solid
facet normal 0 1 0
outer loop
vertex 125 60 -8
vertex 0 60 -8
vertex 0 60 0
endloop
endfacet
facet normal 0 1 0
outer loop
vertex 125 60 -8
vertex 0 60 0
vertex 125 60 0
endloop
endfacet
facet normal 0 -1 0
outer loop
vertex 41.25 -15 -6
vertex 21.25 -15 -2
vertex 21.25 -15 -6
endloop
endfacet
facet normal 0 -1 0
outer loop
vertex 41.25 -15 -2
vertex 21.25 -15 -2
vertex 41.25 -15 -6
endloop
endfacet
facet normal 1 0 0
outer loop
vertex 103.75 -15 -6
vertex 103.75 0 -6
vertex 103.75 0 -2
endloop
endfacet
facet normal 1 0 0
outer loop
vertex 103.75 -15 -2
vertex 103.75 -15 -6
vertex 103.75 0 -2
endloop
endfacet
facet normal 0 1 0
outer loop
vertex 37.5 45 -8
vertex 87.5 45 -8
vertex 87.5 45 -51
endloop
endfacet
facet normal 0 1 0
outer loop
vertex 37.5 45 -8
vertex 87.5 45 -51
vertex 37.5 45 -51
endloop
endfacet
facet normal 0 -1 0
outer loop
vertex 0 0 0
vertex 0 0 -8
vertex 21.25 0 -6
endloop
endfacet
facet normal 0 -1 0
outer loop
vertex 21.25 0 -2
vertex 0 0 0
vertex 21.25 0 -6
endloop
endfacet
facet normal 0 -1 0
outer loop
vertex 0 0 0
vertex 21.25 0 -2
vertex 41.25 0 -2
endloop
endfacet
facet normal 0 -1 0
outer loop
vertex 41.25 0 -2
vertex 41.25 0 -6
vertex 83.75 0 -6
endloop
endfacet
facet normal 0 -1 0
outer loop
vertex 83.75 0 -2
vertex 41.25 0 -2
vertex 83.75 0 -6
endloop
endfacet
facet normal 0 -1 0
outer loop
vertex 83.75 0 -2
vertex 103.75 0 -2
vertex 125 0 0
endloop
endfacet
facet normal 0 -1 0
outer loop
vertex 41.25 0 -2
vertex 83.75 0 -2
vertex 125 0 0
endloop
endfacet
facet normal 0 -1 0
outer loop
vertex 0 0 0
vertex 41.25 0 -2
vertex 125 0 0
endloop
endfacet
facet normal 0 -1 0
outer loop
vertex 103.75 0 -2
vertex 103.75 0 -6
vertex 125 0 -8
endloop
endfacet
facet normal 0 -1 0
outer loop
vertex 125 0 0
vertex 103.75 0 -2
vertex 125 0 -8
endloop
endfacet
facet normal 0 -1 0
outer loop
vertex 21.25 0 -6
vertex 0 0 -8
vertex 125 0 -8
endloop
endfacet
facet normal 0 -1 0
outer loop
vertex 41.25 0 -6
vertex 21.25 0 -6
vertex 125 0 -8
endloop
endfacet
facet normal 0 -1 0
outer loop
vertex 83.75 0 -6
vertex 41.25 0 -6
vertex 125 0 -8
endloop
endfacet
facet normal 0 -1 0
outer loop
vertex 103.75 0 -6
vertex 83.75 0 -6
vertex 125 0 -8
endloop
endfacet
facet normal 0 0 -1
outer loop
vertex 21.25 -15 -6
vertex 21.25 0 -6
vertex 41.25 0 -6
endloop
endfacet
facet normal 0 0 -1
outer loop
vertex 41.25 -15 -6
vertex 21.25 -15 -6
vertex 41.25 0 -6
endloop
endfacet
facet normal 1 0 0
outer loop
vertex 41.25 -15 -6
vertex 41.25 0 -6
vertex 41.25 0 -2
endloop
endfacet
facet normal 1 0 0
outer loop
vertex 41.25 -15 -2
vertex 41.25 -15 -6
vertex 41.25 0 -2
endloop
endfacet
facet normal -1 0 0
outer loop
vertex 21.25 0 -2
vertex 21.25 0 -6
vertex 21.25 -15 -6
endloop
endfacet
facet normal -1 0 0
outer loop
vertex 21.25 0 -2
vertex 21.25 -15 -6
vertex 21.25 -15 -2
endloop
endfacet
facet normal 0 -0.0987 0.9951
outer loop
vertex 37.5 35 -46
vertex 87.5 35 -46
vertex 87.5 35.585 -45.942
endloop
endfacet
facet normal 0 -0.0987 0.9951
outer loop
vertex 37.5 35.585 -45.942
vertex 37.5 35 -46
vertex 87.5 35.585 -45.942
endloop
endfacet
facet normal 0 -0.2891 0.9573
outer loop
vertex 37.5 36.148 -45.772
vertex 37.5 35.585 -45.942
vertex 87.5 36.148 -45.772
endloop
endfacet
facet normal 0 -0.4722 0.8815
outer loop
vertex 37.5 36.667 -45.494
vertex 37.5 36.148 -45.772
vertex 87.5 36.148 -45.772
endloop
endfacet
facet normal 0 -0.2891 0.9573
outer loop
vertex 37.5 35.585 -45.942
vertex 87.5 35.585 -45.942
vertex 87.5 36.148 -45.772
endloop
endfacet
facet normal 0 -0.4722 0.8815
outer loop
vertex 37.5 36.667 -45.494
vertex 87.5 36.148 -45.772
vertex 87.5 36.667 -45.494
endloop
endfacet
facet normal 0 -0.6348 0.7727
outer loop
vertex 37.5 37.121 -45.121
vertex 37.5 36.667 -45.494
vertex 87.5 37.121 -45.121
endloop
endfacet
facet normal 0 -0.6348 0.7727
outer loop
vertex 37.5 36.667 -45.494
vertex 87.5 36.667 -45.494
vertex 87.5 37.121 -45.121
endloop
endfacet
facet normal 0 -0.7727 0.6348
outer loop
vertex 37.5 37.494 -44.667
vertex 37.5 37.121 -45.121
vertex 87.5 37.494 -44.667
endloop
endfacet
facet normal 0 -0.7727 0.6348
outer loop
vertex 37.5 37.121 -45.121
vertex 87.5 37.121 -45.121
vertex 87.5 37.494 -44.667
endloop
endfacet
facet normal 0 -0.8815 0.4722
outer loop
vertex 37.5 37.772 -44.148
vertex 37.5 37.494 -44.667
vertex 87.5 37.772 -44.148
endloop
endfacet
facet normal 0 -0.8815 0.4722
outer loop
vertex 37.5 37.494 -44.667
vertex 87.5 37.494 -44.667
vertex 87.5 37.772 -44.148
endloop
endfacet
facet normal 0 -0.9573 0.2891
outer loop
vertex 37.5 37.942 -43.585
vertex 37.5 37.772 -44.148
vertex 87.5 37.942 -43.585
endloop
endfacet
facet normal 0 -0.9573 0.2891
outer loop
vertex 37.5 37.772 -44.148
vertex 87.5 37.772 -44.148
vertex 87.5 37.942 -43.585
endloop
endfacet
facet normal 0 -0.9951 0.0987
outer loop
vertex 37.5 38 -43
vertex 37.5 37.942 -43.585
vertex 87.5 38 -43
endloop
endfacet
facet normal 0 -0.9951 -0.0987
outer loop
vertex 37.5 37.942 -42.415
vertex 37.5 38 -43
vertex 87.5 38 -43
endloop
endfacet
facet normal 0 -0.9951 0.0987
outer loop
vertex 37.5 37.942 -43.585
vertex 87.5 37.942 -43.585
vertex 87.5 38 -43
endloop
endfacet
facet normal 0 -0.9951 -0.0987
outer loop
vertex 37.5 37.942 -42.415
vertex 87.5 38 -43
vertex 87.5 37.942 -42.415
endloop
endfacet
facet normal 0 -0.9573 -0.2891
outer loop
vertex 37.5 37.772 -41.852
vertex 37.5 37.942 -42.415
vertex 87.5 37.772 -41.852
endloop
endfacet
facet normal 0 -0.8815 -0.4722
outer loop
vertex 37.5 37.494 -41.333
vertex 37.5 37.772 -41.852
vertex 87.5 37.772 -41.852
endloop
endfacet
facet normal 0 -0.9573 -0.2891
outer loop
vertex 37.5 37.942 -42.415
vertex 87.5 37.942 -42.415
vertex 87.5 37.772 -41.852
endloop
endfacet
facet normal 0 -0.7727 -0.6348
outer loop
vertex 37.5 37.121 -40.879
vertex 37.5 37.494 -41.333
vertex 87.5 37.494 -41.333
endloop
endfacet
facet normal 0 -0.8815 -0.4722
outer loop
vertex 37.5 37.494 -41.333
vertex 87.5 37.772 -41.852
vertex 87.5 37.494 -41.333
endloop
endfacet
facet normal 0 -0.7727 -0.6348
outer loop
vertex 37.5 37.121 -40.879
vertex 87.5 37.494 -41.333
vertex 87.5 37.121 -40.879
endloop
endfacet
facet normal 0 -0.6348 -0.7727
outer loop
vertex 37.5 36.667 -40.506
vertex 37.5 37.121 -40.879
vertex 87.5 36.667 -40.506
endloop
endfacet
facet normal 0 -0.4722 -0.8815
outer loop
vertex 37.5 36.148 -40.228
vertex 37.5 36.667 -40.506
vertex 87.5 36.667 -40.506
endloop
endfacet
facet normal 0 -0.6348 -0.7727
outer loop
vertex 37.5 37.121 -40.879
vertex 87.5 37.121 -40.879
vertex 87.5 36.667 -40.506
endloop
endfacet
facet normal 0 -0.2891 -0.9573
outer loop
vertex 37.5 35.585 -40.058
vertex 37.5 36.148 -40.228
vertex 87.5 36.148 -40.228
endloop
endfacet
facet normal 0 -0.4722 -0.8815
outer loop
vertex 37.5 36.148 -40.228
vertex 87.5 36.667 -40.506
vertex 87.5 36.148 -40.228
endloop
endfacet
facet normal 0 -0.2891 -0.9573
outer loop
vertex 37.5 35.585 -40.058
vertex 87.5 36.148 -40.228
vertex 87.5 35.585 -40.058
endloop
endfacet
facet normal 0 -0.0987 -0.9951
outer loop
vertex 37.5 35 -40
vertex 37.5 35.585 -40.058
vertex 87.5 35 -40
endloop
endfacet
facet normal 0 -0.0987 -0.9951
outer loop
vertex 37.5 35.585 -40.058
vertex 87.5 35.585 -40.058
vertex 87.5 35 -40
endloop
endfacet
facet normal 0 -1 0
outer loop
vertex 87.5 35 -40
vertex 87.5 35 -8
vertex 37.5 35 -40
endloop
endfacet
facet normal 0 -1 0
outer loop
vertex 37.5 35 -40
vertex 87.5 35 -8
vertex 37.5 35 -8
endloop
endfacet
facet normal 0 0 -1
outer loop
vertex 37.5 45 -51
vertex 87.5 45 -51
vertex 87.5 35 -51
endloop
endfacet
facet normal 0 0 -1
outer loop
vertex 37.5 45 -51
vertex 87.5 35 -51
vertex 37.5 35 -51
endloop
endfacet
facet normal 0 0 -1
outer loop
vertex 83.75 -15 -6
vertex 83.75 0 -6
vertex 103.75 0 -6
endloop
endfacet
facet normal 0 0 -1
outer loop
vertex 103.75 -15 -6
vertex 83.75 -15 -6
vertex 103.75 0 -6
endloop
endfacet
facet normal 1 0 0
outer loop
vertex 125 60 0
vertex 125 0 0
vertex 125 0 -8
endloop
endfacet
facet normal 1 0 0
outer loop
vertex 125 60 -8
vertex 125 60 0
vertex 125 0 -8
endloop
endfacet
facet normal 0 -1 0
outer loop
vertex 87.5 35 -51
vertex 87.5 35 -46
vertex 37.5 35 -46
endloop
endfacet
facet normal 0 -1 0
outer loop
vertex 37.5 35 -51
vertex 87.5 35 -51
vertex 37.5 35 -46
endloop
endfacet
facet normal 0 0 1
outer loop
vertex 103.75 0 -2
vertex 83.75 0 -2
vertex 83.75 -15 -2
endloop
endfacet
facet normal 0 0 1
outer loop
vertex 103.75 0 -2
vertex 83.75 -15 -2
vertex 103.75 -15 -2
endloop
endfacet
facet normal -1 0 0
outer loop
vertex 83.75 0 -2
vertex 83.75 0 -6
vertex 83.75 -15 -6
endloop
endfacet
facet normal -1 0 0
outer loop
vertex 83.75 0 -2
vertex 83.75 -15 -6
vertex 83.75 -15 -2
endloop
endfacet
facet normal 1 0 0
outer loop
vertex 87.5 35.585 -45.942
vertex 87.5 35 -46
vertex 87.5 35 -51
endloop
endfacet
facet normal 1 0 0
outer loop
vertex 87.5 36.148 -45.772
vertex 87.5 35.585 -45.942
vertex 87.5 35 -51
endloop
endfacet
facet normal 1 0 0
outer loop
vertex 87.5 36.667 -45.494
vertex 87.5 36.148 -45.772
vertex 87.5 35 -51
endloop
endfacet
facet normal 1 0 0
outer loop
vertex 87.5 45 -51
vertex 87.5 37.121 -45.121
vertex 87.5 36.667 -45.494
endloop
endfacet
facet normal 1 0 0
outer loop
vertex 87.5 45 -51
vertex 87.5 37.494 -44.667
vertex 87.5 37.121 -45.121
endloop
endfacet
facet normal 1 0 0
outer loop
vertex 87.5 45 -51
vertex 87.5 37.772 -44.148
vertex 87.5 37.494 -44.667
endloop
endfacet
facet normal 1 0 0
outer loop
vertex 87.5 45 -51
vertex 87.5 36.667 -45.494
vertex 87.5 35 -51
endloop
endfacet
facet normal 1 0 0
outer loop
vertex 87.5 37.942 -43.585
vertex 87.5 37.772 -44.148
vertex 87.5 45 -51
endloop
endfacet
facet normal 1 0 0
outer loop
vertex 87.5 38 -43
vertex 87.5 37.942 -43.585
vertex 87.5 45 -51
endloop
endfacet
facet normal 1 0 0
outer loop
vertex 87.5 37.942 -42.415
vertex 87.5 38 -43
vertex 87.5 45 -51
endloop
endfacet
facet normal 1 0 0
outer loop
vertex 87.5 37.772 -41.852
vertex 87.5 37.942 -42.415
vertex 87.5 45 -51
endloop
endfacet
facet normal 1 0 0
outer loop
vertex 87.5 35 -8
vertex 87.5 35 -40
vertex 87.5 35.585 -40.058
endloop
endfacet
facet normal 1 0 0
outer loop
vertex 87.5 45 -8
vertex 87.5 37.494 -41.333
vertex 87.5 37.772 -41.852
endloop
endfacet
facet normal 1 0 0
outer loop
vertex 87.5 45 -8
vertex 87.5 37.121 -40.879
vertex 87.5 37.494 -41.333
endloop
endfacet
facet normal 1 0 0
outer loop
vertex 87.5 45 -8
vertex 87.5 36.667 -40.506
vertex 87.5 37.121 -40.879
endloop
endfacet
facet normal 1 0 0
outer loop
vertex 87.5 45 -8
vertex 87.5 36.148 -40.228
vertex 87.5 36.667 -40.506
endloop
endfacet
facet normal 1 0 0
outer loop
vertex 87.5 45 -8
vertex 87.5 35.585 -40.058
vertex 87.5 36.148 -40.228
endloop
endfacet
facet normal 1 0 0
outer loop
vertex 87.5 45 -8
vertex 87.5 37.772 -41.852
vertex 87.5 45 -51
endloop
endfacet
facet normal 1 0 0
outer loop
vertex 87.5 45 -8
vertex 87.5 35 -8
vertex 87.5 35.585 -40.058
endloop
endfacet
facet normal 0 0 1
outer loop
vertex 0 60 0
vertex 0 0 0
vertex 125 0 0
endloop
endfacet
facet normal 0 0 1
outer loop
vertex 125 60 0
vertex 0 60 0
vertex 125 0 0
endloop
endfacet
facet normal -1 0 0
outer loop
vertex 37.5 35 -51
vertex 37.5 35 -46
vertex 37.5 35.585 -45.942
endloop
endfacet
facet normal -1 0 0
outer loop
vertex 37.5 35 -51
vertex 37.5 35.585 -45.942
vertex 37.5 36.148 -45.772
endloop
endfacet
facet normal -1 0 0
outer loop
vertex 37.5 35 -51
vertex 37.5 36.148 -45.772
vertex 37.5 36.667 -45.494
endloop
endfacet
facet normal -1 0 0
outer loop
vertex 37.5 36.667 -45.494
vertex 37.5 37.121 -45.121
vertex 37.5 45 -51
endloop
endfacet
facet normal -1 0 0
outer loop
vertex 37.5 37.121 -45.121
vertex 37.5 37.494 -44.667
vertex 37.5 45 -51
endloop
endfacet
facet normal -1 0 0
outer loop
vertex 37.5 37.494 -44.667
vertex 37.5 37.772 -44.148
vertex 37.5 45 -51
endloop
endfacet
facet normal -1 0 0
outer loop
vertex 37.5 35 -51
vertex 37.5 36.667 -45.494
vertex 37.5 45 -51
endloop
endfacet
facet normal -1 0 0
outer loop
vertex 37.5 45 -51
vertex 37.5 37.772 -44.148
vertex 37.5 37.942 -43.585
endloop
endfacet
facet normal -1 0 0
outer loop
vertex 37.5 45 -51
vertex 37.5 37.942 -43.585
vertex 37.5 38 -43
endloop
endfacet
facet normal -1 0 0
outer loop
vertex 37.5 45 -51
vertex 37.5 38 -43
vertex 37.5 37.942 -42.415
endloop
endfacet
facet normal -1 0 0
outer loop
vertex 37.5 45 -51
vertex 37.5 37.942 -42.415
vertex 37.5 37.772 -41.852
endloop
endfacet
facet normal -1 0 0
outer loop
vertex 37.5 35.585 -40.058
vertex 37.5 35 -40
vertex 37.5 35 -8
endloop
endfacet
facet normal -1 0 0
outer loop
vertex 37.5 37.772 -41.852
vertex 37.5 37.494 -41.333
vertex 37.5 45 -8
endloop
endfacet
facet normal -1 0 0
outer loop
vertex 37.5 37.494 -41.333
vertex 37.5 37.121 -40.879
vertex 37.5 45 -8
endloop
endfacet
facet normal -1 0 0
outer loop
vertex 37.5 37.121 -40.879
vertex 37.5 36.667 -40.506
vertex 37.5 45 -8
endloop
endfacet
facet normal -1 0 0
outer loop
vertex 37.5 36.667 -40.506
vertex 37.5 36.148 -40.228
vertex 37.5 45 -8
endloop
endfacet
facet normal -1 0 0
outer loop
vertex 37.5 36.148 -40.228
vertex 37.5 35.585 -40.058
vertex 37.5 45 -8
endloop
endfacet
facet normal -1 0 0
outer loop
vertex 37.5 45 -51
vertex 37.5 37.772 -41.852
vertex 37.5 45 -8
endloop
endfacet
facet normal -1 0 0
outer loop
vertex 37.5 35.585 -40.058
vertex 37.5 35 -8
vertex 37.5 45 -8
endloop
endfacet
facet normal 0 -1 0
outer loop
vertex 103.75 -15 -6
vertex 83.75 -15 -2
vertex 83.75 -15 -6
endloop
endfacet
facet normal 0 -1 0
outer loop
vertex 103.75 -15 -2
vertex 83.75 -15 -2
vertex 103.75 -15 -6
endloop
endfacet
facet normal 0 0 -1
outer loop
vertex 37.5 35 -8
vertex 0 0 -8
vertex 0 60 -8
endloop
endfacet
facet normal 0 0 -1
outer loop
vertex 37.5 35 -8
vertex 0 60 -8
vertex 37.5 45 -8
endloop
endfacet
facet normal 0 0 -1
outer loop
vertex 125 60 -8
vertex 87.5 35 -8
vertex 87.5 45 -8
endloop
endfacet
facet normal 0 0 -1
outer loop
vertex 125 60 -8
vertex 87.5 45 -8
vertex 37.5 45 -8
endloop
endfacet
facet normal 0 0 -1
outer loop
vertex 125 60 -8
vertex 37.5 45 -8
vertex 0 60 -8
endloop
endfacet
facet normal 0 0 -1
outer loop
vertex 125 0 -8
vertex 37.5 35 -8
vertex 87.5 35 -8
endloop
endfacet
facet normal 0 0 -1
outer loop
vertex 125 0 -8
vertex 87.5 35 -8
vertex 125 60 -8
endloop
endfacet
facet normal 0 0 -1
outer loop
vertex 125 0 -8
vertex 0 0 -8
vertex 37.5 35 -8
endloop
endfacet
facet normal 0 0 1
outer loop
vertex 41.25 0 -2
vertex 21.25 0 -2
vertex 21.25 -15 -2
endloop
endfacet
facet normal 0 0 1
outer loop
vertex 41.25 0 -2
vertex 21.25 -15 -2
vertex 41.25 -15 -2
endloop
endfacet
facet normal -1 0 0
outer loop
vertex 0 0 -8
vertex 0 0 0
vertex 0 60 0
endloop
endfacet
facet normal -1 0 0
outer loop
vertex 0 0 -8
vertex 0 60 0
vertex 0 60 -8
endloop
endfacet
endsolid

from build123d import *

# Parameters (mm, degrees)
SKETCH_1_W      = 125
SKETCH_1_H      = 8
EXTRUDE_1_DEPTH = 60
SKETCH_2_W      = 50
SKETCH_2_H      = 10
EXTRUDE_2_DEPTH = 43
SKETCH_3_W      = 20
SKETCH_3_H      = 4
EXTRUDE_3_DEPTH = 15
SKETCH_4_W      = 50
SKETCH_4_H      = 3


with BuildPart() as part:
    # 草图1 → 凸台-拉伸1 (new body)
    with BuildSketch(Plane(origin=(0, 0, 0), x_dir=(1, 0, 0), z_dir=(0, 1, 0))):
        with Locations((62.5, 4)):
            Rectangle(SKETCH_1_W, SKETCH_1_H)
    extrude(amount=EXTRUDE_1_DEPTH)

    # 草图2 → 凸台-拉伸2 (add)
    with BuildSketch(Plane(origin=(0, 0, -8), x_dir=(-1, 0, 0), z_dir=(0, 0, -1))):
        with Locations((-62.5, 40)):
            Rectangle(SKETCH_2_W, SKETCH_2_H)
    extrude(amount=EXTRUDE_2_DEPTH)

    # 草图3 → 凸台-拉伸3 (add)
    with BuildSketch(Plane.XZ):
        with Locations((31.25, -4)):
            Rectangle(SKETCH_3_W, SKETCH_3_H)
        with Locations((93.75, -4)):
            Rectangle(SKETCH_3_W, SKETCH_3_H)
    extrude(amount=EXTRUDE_3_DEPTH)

    # 草图4 → 切除-旋转1 (revolve, cut)
    with BuildSketch(Plane.XZ.offset(-35)):
        with Locations((62.5, -44.5)):
            Rectangle(SKETCH_4_W, SKETCH_4_H)
    revolve(axis=Axis((37.5, 35, -43), (1, 0, 0)), mode=Mode.SUBTRACT)


solid = part.part
